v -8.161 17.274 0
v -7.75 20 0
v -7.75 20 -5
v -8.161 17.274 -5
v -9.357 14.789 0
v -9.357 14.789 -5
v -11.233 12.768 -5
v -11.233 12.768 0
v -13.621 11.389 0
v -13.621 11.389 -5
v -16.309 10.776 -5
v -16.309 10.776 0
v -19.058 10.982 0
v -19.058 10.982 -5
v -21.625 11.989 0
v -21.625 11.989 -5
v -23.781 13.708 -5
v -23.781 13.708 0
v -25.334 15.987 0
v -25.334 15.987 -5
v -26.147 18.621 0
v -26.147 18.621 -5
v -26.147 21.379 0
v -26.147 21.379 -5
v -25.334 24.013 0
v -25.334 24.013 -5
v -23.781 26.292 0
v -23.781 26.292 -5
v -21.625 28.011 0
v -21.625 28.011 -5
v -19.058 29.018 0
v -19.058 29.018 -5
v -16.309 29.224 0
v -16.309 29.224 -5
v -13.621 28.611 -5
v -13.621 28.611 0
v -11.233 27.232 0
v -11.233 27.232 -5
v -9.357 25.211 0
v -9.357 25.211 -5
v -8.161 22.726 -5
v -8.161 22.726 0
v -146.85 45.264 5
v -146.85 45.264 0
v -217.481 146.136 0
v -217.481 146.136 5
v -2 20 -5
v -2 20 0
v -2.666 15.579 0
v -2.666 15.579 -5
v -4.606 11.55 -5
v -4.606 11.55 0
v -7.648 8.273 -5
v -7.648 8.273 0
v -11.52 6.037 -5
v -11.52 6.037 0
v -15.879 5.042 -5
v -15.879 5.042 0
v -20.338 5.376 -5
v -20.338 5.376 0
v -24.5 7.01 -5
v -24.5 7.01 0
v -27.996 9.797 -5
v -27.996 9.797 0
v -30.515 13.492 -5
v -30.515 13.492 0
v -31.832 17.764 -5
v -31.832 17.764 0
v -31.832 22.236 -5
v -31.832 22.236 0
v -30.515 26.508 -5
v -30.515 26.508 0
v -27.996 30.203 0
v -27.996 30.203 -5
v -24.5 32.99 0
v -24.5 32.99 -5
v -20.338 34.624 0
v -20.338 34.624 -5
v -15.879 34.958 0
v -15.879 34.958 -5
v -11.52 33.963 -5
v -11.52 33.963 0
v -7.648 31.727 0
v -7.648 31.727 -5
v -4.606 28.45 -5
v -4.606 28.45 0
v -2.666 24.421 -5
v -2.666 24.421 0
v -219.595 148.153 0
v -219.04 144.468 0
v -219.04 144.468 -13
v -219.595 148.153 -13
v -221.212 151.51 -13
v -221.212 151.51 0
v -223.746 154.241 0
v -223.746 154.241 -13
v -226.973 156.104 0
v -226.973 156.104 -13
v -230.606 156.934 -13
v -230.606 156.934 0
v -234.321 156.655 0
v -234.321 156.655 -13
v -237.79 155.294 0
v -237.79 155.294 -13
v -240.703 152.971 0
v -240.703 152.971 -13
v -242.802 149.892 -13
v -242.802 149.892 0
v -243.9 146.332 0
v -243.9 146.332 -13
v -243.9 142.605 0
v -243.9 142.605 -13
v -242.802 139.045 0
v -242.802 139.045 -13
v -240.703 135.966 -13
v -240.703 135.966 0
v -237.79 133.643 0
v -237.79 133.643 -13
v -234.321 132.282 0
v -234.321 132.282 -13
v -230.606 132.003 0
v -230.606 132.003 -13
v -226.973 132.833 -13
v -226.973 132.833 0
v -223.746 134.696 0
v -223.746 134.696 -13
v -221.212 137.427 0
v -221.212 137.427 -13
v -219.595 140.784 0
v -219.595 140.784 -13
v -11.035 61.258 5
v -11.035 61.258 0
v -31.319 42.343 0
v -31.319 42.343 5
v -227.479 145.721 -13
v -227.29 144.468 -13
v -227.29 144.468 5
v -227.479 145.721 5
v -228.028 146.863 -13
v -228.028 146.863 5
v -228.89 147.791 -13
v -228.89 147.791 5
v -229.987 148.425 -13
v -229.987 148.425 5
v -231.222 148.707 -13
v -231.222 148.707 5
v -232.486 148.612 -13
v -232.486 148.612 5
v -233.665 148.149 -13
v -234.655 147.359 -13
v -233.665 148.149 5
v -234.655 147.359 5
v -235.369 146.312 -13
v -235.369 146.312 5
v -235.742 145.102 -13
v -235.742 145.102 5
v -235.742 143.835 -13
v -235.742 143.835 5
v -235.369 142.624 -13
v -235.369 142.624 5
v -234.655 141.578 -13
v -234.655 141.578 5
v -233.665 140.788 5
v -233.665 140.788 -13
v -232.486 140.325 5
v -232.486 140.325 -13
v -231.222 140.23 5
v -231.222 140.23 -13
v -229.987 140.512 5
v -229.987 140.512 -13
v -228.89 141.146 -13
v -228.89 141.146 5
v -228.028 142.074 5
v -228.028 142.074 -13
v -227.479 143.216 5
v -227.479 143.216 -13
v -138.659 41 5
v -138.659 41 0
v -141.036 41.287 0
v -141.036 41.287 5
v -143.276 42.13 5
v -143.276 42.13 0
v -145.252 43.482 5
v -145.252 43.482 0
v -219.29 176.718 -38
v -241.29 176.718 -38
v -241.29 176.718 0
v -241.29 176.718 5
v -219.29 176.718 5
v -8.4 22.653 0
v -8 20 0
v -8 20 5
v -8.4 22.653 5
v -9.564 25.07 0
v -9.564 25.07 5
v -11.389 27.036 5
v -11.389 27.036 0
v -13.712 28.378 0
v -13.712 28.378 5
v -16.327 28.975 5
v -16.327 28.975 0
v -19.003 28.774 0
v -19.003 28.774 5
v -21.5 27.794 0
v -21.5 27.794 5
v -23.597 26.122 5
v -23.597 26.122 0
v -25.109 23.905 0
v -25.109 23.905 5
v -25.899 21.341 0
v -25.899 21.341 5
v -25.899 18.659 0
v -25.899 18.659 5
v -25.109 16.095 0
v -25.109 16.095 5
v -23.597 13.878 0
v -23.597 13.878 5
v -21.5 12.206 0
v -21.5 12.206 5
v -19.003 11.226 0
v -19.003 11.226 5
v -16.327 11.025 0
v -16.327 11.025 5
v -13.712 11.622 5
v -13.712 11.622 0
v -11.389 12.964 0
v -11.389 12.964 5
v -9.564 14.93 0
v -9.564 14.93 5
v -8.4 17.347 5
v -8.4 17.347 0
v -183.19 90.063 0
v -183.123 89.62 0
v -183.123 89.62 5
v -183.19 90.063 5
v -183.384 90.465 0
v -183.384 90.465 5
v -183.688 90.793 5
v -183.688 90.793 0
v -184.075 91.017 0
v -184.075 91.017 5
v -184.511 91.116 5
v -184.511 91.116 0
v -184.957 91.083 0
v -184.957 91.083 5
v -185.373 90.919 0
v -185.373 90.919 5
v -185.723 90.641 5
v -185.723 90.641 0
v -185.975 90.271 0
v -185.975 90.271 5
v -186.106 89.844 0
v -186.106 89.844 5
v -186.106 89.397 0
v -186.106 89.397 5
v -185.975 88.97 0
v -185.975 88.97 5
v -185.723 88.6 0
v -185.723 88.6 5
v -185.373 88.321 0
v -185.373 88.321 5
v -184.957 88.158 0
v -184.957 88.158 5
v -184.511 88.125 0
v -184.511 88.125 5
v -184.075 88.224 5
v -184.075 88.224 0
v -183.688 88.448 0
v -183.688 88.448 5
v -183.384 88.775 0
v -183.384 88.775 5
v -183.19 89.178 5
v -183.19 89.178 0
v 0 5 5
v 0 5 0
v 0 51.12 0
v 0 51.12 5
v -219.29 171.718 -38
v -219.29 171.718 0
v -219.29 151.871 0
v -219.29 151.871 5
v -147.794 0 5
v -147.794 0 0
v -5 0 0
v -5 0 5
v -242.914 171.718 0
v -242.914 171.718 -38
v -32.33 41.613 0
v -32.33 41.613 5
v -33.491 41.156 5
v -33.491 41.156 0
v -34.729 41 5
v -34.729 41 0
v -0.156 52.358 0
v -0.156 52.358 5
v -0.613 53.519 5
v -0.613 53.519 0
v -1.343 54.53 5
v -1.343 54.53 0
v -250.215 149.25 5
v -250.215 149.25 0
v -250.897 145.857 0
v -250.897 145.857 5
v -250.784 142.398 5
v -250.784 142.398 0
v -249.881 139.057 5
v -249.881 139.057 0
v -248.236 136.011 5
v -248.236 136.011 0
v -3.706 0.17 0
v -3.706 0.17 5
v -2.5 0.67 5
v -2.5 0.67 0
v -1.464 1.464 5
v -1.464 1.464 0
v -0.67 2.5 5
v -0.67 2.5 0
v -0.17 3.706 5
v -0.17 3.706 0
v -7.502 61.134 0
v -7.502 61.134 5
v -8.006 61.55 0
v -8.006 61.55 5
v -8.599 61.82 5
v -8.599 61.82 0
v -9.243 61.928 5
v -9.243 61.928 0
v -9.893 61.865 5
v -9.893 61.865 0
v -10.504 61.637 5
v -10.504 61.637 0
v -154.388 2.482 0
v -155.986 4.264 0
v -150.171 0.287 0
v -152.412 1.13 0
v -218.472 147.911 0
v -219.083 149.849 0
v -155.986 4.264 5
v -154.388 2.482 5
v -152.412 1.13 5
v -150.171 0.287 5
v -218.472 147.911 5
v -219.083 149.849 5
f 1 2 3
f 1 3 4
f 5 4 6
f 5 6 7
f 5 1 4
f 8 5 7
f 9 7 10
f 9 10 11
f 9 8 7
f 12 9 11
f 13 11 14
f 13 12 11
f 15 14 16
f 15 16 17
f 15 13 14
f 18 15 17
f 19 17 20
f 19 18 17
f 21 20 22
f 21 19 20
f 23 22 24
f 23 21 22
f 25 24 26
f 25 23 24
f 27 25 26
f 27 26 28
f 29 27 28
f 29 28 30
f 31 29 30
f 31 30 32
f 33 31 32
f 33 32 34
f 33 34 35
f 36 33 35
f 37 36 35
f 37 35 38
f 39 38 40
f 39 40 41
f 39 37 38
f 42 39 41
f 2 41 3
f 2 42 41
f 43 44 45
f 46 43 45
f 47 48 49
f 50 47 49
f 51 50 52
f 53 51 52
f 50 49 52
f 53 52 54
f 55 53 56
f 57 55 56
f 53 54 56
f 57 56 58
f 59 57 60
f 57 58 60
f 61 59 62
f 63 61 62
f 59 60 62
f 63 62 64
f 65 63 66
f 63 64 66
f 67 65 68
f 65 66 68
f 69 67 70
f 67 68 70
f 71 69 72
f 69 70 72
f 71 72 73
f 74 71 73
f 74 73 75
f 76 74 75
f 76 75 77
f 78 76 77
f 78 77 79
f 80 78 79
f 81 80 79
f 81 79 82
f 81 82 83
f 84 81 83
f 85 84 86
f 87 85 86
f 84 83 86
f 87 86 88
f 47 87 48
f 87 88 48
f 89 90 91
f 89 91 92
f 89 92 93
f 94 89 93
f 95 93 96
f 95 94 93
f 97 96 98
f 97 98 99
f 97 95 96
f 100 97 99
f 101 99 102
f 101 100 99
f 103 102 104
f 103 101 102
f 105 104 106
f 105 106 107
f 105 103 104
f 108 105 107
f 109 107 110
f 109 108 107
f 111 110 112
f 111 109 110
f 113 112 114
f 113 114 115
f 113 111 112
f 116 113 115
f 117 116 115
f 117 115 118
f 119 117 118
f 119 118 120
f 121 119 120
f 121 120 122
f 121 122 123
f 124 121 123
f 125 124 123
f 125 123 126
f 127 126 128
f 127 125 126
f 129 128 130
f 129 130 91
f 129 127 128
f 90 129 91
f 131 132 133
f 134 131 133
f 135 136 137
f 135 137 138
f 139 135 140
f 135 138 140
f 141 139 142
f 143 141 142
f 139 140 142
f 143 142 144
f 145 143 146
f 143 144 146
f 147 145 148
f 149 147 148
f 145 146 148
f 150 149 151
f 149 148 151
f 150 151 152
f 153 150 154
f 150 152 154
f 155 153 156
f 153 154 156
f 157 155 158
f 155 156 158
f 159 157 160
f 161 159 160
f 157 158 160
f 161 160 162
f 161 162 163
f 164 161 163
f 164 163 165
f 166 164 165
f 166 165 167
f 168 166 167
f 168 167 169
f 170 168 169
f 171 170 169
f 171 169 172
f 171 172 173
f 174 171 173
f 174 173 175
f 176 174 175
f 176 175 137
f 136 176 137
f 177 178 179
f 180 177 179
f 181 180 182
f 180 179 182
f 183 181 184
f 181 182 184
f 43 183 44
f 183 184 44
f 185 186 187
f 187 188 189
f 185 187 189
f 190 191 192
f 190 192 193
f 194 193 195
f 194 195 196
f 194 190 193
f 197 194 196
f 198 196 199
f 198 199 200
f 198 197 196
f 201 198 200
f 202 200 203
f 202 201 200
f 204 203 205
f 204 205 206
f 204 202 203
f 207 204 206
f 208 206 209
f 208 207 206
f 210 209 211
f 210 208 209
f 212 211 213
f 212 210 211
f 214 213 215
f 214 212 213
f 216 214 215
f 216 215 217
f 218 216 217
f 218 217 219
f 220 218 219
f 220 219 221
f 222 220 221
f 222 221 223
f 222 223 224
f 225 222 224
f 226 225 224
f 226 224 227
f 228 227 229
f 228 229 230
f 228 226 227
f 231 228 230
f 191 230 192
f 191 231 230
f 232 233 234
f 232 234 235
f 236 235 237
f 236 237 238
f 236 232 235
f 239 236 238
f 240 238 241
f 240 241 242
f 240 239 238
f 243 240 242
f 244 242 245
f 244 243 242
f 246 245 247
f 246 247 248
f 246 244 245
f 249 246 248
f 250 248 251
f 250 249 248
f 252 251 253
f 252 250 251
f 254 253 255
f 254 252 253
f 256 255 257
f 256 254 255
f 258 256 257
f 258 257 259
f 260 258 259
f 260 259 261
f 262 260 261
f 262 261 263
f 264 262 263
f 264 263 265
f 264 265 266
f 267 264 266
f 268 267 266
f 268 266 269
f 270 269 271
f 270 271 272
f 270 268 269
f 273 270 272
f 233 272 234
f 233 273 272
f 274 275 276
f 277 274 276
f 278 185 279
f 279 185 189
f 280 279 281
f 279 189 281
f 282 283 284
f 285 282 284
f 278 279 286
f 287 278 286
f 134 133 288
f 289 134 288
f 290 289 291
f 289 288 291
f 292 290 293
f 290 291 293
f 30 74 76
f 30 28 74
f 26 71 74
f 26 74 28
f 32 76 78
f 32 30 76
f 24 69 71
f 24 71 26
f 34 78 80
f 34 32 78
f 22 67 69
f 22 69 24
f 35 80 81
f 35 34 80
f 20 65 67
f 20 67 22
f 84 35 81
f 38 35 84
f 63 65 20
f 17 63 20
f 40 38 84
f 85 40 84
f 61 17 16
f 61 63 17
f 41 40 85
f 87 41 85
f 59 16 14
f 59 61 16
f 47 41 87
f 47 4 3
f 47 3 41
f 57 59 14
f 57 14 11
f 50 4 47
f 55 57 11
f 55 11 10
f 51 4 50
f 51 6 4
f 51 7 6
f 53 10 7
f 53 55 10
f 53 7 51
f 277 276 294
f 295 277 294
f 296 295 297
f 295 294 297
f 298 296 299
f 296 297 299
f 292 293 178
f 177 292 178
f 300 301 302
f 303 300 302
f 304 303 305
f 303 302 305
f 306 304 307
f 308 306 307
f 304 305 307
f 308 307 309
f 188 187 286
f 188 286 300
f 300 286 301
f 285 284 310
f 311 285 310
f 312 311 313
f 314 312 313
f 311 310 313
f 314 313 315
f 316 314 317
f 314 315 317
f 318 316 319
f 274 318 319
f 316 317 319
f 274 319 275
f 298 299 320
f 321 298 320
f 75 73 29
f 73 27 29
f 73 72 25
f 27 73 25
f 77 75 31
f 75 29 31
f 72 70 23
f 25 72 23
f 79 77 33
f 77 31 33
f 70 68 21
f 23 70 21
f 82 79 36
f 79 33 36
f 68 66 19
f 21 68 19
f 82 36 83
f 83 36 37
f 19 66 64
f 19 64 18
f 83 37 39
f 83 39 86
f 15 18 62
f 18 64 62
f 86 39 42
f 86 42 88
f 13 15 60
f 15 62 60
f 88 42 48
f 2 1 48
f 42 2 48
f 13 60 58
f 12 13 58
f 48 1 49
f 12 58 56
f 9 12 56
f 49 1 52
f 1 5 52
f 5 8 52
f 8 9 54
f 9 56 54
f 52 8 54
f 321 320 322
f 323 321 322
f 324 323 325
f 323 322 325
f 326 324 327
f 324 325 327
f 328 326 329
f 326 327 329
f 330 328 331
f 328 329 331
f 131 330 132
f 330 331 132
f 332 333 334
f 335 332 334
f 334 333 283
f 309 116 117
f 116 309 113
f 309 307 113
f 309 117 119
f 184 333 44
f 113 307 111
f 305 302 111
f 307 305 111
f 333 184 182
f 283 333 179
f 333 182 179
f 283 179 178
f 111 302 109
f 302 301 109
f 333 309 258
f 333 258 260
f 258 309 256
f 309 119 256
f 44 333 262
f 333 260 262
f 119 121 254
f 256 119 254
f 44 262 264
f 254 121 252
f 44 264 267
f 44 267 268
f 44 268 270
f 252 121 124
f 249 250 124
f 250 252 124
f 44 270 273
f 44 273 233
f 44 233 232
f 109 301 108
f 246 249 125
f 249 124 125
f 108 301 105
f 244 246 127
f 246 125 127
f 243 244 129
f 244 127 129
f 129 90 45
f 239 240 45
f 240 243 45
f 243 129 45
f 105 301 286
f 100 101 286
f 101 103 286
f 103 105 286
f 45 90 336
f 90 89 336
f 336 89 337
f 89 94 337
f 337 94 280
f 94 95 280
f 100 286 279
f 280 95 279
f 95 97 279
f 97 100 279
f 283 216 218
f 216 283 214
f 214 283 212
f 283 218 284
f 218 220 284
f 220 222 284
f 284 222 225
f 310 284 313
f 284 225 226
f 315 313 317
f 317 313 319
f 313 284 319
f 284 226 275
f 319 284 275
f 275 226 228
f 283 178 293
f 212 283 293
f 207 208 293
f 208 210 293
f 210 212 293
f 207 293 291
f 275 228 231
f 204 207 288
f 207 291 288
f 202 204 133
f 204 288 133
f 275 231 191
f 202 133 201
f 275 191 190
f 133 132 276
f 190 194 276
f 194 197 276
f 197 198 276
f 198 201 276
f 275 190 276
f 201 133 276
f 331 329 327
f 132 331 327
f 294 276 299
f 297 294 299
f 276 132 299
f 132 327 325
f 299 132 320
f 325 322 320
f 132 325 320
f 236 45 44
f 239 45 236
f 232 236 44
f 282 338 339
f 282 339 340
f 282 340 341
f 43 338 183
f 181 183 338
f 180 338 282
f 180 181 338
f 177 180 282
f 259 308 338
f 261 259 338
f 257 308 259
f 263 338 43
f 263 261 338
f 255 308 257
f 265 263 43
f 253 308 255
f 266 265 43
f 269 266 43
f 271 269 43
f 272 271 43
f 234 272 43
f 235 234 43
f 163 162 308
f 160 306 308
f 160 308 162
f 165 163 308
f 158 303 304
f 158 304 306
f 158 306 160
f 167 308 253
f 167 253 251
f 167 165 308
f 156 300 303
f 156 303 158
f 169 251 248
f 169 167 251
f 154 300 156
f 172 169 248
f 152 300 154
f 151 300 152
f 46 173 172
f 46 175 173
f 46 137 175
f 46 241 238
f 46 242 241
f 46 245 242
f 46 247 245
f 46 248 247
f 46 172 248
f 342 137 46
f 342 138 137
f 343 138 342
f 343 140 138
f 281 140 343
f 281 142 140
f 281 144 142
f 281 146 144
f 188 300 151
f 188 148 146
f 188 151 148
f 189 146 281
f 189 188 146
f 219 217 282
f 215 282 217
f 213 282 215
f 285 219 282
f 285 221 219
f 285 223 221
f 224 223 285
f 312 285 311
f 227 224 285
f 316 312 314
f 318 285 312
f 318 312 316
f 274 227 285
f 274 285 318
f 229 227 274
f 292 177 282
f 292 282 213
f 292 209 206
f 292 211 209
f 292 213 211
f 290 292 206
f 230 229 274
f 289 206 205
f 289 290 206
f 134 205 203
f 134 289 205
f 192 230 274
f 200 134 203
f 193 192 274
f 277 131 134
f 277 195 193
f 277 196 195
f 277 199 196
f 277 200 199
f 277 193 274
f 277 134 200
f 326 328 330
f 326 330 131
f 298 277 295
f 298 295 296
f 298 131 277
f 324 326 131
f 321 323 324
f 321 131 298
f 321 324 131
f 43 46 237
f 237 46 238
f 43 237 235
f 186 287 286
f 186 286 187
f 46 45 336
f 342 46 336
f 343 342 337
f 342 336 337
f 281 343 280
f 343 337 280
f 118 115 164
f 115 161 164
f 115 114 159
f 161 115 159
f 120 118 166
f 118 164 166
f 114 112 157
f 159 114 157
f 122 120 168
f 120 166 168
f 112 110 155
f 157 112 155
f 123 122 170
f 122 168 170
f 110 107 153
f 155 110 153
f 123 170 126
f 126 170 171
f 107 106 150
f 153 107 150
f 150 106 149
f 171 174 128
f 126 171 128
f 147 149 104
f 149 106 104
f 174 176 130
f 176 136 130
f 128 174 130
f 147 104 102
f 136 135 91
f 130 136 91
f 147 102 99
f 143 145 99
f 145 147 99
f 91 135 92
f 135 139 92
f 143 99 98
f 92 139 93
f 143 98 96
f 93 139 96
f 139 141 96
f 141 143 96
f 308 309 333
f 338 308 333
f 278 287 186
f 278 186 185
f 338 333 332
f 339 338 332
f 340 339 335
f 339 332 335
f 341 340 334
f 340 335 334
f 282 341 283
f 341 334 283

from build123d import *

# Parameters (mm, degrees)
F0_R     = 9
F0_R_2   = 1.5
F1_DEPTH = 5
F3_DEPTH = 38
F4_R     = 12.5
F5_DEPTH = 13
F6_R     = 4.25
F7_DEPTH = 43.001
F8_R     = 15
F8_R_2   = 9.25
F9_DEPTH = 5


with BuildPart() as f1:
    # F0 (on Top) → F1 (new body)
    with BuildSketch(Plane.XY):
        with BuildLine():
            Line((-147.794329, 0), (-5, 0))
            ThreePointArc((-5, 0), (-1.464466, 1.464466), (0, 5))
            Line((0, 5), (0, 51.119951))
            ThreePointArc((0, 51.119951), (-0.347912, 52.952457), (-1.343231, 54.529943))
            Line((-1.343231, 54.529943), (-7.501982, 61.134394))
            ThreePointArc((-7.501982, 61.134394), (-9.243117, 61.927875), (-11.035362, 61.257782))
            Line((-11.035362, 61.257782), (-31.318735, 42.343231))
            ThreePointArc((-31.318735, 42.343231), (-32.89622, 41.347912), (-34.728727, 41))
            Line((-34.728727, 41), (-138.658826, 41))
            ThreePointArc((-138.658826, 41), (-143.276312, 42.129892), (-146.850347, 45.264236))
            Line((-146.850347, 45.264236), (-217.481319, 146.135717))
            ThreePointArc((-217.481319, 146.135717), (-218.826968, 148.864424), (-219.289798, 151.871482))
            Line((-219.289798, 151.871482), (-219.289798, 176.718494))
            Line((-219.289798, 176.718494), (-241.289798, 176.718494))
            Line((-241.289798, 176.718494), (-250.214761, 149.250282))
            ThreePointArc((-250.214761, 149.250282), (-250.784151, 142.397886), (-248.236194, 136.011381))
            Line((-248.236194, 136.011381), (-155.98585, 4.264236))
            ThreePointArc((-155.98585, 4.264236), (-152.411816, 1.129892), (-147.794329, 0))
        make_face()
        with Locations((-17, 20)):
            Circle(F0_R, mode=Mode.SUBTRACT)
        with Locations((-184.623116, 89.620384)):
            Circle(F0_R_2, mode=Mode.SUBTRACT)
    extrude(amount=F1_DEPTH)

    # F2 (on face) → F3 (join)
    with BuildSketch(Plane(origin=(0, 0, 0), x_dir=(1, 0, 0), z_dir=(0, 0, -1))):
        Polygon((-242.914397, -171.718494), (-241.289798, -176.718494), (-219.289798, -176.718494), (-219.289798, -171.718494), align=None)
    extrude(amount=F3_DEPTH)

    # F4 (on face) → F5 (join)
    with BuildSketch(Plane.XY):
        with Locations((-231.539798, 144.468494)):
            Circle(F4_R)
    extrude(amount=-F5_DEPTH)

    # F6 (on face) → F7 (cut, through all)
    with BuildSketch(Plane.XY.offset(5)):
        with Locations((-231.539798, 144.468494)):
            Circle(F6_R)
    extrude(amount=-F7_DEPTH, mode=Mode.SUBTRACT)


with BuildPart() as f9:
    # F8 (on face) → F9 (new body)
    with BuildSketch(Plane(origin=(0, 0, 0), x_dir=(1, 0, 0), z_dir=(0, 0, -1))):
        with Locations((-17, -20)):
            Circle(F8_R)
        with Locations((-17, -20)):
            Circle(F8_R_2, mode=Mode.SUBTRACT)
    extrude(amount=F9_DEPTH)


solid = Compound([f1.part, f9.part])
